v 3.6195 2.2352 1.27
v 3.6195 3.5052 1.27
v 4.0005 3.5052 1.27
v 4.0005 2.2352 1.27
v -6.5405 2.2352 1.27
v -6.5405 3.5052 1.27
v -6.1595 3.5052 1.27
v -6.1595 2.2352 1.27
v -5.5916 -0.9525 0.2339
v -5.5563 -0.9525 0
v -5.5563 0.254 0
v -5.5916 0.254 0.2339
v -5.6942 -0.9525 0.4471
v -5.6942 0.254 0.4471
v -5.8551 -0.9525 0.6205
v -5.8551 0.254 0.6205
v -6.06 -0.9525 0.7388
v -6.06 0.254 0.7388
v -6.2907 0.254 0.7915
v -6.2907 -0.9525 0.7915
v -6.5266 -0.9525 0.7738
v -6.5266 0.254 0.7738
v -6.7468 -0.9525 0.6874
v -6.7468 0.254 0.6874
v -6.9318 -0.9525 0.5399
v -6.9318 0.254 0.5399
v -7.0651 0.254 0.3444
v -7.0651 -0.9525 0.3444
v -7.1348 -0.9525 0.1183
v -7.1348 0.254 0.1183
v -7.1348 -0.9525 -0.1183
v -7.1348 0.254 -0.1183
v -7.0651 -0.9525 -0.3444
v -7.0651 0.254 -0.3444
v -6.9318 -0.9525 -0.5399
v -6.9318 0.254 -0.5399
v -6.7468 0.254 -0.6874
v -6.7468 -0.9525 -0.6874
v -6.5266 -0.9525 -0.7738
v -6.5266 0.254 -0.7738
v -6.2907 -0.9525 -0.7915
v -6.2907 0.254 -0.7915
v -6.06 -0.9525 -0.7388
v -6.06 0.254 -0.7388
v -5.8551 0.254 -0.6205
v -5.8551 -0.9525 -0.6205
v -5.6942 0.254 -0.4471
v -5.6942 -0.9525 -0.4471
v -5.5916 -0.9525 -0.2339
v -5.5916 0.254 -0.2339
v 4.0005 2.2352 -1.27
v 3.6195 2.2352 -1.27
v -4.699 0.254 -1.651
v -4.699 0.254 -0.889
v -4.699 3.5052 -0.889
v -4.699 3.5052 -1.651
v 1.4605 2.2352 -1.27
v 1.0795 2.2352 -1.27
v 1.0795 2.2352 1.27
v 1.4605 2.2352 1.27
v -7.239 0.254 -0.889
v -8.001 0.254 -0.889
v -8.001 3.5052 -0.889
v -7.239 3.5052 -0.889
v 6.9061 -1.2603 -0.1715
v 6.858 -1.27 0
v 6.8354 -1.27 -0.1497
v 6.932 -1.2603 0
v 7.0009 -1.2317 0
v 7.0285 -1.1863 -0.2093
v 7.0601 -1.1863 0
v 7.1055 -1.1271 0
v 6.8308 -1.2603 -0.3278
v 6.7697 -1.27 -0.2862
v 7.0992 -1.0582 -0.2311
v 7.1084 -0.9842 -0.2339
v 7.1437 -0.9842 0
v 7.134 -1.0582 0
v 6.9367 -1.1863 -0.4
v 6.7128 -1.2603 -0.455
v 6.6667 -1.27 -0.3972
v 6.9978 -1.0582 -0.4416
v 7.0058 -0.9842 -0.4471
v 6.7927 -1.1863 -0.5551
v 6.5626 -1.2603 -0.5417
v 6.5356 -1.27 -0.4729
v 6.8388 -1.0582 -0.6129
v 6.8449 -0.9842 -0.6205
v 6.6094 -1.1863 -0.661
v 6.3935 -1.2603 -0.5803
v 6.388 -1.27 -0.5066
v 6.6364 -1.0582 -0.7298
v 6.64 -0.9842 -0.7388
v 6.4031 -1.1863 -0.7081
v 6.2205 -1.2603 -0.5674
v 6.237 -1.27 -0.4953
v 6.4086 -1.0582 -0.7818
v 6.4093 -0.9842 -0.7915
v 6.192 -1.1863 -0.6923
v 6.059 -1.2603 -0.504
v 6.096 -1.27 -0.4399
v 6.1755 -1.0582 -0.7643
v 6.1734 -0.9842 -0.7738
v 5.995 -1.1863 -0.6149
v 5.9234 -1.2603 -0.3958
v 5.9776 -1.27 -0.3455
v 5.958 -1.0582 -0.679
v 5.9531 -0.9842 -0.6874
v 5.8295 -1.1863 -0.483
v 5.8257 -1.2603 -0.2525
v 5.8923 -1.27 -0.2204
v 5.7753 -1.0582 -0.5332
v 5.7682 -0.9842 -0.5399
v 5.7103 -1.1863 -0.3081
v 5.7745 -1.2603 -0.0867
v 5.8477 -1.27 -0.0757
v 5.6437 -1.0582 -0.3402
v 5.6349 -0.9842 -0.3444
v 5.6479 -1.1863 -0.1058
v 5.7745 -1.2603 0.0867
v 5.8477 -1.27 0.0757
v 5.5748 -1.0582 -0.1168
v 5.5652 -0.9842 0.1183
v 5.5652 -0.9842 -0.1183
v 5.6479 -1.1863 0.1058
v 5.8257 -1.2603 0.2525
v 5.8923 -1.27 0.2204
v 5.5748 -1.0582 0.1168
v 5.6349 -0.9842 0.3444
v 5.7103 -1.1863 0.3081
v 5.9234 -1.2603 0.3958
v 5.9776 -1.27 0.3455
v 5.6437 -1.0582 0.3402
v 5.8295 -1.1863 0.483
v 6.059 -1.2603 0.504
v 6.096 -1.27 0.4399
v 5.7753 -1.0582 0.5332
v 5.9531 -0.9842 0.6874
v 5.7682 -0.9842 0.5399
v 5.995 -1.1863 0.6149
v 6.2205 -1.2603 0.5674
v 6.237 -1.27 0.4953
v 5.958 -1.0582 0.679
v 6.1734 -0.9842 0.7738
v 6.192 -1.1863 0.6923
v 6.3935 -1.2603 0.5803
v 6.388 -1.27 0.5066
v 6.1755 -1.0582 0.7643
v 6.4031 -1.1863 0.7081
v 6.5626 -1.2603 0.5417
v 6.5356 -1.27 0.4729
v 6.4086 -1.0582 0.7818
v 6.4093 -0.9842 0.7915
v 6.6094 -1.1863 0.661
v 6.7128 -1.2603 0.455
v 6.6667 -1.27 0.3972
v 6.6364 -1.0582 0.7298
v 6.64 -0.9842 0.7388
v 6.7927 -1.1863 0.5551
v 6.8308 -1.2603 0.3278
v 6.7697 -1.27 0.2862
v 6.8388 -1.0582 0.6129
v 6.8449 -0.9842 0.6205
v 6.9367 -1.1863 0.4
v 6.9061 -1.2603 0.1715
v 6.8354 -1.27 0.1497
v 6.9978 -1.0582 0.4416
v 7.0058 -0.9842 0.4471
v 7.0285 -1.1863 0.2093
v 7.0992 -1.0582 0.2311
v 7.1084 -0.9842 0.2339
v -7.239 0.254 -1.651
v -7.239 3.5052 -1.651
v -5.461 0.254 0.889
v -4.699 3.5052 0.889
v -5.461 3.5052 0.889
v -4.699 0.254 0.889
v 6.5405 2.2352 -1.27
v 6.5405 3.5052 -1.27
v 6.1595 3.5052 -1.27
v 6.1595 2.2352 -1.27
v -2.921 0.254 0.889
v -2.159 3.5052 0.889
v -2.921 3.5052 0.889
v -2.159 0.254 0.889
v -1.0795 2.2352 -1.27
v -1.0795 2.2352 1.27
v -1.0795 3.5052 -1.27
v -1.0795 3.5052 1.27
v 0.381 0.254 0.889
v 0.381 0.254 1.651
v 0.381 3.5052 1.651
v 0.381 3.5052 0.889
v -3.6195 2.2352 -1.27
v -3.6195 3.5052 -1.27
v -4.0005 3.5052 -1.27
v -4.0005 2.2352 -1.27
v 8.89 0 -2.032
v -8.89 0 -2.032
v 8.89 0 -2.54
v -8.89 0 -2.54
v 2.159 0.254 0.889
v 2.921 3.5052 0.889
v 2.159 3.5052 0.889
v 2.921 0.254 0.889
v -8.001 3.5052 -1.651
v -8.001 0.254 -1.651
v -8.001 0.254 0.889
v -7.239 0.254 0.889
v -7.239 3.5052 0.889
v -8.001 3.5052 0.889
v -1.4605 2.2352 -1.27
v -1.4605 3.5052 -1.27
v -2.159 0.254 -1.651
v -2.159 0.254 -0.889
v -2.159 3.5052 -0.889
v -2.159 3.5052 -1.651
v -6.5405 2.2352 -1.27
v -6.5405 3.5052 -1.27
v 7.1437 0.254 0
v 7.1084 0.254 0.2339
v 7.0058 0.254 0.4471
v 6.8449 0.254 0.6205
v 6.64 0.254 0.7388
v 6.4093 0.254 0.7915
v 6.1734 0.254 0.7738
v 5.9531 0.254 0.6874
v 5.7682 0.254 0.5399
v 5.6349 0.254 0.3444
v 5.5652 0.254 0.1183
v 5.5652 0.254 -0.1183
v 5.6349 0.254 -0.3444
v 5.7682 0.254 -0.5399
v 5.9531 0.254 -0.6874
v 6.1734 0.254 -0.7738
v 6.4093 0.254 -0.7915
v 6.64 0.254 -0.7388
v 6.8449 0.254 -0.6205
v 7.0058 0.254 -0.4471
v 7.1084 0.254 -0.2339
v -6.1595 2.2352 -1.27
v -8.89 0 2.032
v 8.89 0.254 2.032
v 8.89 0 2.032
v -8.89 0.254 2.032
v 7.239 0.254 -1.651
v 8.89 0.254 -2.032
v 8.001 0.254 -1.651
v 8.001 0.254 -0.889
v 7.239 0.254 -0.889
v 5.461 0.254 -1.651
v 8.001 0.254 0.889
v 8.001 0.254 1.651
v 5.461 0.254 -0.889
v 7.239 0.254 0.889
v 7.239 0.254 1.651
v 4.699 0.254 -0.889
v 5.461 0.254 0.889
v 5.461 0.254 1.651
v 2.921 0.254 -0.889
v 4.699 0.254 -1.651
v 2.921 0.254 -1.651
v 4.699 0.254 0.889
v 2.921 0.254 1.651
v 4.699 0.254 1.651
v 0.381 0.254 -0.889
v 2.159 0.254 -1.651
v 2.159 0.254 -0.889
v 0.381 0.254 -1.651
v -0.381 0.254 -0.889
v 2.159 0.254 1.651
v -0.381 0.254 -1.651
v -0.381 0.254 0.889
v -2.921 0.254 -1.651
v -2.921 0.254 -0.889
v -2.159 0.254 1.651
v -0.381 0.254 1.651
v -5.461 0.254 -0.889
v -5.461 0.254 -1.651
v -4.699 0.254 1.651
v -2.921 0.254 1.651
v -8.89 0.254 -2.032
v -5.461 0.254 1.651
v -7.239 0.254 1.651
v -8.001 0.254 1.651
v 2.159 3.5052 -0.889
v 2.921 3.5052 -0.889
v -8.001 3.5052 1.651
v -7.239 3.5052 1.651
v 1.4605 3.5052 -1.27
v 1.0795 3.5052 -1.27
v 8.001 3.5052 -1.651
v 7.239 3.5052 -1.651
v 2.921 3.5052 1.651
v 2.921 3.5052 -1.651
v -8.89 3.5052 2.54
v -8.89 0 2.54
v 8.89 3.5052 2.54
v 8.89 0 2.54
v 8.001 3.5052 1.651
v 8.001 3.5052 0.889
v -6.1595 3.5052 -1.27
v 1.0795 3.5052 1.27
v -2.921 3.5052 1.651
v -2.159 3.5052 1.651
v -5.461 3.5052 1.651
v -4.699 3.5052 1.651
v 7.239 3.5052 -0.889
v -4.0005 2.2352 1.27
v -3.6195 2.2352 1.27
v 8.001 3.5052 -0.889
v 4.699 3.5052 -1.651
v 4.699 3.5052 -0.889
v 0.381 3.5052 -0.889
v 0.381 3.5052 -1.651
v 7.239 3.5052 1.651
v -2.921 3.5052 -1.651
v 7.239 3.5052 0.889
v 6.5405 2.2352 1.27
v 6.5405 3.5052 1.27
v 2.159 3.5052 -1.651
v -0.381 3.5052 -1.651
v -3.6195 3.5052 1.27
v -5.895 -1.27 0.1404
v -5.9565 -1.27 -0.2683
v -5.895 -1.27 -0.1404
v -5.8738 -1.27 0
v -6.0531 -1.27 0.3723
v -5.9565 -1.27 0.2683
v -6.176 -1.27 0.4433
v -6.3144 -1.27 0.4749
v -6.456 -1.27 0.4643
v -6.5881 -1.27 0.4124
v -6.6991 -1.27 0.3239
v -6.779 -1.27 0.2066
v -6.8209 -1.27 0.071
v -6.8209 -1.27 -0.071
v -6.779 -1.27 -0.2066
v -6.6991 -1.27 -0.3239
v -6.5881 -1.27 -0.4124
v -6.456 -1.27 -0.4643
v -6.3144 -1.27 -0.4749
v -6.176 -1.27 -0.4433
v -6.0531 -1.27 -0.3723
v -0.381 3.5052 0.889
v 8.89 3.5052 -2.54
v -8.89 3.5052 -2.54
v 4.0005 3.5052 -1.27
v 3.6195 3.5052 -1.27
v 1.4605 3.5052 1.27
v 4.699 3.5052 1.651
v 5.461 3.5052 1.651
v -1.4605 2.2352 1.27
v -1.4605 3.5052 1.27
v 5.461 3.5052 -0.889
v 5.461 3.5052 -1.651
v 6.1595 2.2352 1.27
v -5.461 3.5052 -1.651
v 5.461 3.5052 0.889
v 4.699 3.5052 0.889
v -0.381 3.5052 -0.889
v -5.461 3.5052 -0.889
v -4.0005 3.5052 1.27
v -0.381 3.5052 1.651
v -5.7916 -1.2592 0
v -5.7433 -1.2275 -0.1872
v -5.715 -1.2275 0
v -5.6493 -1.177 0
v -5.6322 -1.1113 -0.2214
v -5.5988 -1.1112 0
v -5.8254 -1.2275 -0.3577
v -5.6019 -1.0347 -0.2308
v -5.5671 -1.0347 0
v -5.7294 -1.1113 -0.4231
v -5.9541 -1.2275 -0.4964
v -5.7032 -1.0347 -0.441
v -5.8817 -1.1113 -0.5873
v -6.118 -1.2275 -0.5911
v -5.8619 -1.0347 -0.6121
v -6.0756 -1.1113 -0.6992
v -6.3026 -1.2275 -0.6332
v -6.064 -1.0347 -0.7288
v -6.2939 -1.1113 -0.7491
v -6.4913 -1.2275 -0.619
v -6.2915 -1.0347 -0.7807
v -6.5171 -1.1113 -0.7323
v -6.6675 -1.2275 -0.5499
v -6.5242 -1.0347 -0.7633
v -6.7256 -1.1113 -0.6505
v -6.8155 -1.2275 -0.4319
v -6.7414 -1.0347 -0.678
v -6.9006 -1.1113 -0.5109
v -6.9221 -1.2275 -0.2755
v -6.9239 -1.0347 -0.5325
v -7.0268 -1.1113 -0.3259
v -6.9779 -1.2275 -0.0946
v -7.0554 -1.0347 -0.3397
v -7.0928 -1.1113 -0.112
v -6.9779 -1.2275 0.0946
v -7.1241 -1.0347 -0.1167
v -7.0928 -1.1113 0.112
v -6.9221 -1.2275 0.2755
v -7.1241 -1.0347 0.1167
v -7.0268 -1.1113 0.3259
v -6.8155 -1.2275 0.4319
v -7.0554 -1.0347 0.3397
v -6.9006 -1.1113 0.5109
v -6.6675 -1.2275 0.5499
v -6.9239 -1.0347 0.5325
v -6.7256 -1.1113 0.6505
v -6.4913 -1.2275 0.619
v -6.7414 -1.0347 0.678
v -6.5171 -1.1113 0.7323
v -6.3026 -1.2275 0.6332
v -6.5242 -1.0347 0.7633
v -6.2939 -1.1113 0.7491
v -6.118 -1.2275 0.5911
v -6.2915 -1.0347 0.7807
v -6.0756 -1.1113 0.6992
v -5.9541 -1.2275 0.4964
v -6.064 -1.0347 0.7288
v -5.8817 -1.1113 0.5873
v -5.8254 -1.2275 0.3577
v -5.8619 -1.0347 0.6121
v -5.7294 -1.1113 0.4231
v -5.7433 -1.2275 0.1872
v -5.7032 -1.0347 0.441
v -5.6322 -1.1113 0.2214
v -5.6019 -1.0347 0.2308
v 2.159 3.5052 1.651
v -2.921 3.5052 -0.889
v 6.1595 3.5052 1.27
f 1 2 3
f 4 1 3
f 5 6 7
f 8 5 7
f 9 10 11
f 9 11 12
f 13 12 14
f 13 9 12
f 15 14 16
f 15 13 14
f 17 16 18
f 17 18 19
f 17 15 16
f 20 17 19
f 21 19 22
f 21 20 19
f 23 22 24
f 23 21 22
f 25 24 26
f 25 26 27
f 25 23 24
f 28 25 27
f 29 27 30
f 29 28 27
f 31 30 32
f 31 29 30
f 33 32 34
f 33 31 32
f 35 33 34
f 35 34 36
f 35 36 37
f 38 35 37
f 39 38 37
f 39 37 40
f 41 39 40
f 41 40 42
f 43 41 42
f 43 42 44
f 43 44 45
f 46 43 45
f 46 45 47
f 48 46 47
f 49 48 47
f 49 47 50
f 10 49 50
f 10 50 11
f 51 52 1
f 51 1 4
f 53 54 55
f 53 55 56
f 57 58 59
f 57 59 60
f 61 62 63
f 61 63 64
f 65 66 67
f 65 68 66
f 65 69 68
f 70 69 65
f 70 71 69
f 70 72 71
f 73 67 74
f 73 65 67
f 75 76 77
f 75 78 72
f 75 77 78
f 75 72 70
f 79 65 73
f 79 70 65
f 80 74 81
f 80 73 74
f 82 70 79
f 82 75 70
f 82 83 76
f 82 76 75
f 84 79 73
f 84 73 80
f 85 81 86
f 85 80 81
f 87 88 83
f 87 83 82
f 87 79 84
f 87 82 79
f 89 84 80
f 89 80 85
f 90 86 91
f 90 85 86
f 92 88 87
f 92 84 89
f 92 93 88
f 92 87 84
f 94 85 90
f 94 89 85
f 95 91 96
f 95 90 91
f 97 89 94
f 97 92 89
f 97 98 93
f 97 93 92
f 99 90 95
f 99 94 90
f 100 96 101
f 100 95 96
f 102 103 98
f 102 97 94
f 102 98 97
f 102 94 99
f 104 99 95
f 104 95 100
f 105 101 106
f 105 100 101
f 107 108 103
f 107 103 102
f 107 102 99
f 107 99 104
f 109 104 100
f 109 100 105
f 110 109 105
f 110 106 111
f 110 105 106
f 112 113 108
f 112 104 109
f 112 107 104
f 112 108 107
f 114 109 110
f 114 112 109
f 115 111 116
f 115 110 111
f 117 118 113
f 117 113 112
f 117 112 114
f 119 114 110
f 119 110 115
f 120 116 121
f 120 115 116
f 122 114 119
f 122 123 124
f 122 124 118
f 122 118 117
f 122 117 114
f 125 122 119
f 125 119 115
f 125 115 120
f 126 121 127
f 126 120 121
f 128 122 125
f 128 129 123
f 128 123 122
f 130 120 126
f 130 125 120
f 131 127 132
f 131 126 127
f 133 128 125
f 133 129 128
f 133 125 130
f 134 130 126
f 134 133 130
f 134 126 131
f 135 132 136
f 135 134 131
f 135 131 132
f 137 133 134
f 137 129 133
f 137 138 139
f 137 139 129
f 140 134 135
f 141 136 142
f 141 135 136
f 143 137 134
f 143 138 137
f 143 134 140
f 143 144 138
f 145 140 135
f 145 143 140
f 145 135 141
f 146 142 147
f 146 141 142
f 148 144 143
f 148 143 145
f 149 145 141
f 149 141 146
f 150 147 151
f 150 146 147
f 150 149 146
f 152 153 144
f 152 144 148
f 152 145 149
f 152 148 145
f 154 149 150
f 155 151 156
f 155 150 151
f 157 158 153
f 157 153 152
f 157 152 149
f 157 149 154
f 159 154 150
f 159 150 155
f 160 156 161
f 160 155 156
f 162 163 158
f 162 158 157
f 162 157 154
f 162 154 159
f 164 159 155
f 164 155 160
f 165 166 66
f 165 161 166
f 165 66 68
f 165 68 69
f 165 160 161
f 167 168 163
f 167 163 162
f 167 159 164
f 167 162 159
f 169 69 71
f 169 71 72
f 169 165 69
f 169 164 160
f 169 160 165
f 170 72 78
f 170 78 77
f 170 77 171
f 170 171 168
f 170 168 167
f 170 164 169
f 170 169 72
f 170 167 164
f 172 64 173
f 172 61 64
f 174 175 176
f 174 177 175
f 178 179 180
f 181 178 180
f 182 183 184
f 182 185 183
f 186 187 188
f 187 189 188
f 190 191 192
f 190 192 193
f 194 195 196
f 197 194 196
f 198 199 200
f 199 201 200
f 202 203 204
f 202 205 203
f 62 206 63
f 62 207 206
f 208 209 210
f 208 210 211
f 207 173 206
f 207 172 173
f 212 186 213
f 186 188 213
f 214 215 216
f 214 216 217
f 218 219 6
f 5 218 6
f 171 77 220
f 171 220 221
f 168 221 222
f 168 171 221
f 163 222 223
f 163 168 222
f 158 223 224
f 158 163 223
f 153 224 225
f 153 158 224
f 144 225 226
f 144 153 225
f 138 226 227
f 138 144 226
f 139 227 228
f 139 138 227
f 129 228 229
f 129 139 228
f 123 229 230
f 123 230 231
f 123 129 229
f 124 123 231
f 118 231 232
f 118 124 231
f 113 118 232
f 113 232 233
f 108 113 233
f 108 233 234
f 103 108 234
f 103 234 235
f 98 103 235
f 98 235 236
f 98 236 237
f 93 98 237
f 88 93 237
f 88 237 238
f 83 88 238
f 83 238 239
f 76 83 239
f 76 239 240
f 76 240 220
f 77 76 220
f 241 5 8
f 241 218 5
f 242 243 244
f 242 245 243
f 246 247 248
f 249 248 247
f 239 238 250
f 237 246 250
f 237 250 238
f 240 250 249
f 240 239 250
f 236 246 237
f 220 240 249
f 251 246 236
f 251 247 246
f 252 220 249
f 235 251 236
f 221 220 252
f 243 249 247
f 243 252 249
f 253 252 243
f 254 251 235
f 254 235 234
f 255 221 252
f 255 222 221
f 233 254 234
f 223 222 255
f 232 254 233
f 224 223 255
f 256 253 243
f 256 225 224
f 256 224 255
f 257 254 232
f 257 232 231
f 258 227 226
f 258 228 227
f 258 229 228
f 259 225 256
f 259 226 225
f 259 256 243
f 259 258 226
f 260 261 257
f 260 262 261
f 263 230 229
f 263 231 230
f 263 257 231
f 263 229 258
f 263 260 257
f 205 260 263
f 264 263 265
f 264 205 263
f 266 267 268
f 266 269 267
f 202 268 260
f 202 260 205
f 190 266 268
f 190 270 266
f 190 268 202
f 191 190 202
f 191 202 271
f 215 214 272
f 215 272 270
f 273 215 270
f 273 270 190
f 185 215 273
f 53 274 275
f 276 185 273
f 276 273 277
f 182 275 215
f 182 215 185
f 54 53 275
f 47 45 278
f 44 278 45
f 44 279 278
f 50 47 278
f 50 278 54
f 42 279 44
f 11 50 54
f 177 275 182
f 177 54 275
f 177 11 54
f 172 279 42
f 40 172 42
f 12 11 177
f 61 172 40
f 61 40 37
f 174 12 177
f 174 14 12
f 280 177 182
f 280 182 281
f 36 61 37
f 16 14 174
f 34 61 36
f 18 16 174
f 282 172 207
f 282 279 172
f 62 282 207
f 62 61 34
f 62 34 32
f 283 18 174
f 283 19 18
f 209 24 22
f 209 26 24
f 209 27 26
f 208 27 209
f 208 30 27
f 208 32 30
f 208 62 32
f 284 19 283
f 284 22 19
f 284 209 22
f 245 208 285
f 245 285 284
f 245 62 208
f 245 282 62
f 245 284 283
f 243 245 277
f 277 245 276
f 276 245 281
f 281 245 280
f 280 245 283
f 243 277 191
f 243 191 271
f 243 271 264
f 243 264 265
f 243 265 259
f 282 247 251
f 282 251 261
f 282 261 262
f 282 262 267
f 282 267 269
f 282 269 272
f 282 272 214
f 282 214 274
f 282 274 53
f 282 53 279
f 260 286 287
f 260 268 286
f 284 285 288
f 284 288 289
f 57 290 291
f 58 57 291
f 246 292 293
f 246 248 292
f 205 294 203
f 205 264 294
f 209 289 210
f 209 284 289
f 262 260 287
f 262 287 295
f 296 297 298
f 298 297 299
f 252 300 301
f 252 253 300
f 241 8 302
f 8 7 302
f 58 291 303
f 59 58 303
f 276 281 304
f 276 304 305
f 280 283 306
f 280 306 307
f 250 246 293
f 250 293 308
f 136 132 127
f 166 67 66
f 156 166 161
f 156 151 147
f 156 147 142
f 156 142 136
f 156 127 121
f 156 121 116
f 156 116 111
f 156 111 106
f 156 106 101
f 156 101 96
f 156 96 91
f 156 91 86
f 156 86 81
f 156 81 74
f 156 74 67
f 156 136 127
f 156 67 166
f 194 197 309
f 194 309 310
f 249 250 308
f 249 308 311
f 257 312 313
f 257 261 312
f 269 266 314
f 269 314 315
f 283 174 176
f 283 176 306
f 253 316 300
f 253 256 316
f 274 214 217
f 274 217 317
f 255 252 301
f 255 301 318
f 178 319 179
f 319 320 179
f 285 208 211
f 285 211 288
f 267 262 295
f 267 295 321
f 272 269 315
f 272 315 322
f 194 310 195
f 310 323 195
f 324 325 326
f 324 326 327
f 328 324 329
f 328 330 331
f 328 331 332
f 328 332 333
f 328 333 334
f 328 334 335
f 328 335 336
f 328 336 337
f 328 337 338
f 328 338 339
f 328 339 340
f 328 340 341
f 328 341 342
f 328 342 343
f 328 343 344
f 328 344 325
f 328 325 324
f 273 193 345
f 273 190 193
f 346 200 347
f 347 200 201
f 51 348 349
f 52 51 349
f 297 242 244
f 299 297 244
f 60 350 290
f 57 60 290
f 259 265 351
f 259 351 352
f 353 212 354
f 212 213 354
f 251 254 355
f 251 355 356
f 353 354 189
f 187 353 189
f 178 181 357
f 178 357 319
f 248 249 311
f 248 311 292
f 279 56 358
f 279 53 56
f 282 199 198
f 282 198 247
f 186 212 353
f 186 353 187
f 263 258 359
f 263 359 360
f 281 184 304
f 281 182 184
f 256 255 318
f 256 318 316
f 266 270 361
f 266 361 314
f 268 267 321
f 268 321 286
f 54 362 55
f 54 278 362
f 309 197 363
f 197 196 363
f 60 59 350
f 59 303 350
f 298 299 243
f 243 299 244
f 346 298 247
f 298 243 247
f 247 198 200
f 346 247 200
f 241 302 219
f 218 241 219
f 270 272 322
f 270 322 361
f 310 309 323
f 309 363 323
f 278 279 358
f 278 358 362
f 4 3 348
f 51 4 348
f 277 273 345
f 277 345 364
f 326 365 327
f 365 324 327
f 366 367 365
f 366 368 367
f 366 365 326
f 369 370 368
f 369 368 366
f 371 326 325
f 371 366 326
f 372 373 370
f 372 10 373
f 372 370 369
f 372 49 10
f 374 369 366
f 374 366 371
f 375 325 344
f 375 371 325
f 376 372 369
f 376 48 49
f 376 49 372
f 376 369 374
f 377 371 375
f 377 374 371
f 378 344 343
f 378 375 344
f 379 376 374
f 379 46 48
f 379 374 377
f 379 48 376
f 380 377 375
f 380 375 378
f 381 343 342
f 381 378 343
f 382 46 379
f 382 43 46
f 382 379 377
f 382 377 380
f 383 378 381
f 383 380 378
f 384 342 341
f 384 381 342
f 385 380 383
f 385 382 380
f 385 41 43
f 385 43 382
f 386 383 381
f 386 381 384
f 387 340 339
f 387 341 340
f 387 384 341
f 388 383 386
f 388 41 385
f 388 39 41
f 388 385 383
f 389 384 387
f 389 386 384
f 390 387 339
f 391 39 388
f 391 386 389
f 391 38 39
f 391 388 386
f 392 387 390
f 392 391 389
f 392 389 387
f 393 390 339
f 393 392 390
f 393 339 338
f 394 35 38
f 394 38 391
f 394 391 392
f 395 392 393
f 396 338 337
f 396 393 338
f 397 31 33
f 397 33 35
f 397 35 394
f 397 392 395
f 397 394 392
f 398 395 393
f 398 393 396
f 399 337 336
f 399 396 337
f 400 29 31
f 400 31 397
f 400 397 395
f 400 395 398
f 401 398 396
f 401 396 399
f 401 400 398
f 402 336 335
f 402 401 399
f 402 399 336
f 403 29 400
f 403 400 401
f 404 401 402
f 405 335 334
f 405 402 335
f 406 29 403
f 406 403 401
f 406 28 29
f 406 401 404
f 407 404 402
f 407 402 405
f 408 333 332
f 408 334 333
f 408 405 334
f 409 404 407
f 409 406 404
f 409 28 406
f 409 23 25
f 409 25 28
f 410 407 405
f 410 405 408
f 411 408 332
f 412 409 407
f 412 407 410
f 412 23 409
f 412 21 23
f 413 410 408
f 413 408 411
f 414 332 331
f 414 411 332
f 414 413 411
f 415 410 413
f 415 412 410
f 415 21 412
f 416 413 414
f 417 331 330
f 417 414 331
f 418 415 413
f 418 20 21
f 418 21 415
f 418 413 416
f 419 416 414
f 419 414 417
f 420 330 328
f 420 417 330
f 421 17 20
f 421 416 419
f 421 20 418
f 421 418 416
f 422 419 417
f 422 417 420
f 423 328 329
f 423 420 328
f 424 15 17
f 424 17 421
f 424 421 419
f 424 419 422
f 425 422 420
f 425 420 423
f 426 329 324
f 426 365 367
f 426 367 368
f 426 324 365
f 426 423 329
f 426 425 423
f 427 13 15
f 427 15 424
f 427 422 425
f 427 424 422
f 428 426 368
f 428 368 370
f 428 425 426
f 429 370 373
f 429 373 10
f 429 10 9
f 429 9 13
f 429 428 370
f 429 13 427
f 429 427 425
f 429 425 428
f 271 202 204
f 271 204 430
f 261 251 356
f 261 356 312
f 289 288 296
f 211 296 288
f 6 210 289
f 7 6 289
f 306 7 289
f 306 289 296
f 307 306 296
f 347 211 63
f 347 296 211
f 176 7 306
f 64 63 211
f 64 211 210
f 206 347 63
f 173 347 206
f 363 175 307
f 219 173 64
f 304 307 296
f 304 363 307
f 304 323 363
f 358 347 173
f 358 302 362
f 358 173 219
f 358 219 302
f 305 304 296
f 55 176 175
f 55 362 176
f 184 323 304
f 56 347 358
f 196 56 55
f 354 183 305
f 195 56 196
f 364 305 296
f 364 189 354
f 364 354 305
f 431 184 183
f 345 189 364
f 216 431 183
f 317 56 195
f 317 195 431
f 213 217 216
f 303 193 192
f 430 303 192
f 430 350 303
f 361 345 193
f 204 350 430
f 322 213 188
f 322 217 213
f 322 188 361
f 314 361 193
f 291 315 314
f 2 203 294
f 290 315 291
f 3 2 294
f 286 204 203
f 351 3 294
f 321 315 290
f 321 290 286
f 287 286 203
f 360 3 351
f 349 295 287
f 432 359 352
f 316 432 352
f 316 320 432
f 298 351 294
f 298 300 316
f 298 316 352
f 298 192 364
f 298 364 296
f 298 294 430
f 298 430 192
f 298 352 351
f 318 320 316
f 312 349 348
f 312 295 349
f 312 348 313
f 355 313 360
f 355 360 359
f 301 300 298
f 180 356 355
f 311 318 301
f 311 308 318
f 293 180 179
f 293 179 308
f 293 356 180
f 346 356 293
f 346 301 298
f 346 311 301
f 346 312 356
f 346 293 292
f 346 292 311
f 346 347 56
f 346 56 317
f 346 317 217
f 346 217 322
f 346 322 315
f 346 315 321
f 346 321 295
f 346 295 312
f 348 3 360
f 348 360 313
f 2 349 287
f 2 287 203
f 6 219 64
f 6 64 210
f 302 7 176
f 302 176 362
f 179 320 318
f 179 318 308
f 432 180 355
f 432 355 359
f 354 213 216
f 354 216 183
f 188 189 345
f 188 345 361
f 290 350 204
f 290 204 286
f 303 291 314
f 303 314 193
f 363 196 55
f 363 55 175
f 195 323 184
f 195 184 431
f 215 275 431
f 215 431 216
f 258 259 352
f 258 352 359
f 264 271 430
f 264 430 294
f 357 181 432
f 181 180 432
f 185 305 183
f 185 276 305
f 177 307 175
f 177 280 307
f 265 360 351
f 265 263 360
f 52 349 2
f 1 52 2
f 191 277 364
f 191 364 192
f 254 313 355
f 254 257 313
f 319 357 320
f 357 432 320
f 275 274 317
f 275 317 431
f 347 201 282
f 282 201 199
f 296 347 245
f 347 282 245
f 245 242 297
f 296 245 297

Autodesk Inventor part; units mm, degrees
sketch "Sketch_1" plane through (0, 0, 0) normal (0, 1, 0) x (1, 0, 0)
  line L0 (-8.89, 2.54) -> (-8.89, -2.54)
  line L1 (-8.89, -2.54) -> (8.89, -2.54)
  line L2 (8.89, -2.54) -> (8.89, 2.54)
  line L3 (8.89, 2.54) -> (-8.89, 2.54)
  line L4 (7.239, -0.889) -> (7.239, -1.651)
  line L5 (7.239, -1.651) -> (8.001, -1.651)
  line L6 (8.001, -1.651) -> (8.001, -0.889)
  line L7 (8.001, -0.889) -> (7.239, -0.889)
  line L8 (7.239, 1.651) -> (7.239, 0.889)
  line L9 (7.239, 0.889) -> (8.001, 0.889)
  line L10 (8.001, 0.889) -> (8.001, 1.651)
  line L11 (8.001, 1.651) -> (7.239, 1.651)
  line L12 (4.699, -0.889) -> (4.699, -1.651)
  line L13 (4.699, -1.651) -> (5.461, -1.651)
  line L14 (5.461, -1.651) -> (5.461, -0.889)
  line L15 (5.461, -0.889) -> (4.699, -0.889)
  line L16 (4.699, 1.651) -> (4.699, 0.889)
  line L17 (4.699, 0.889) -> (5.461, 0.889)
  line L18 (5.461, 0.889) -> (5.461, 1.651)
  line L19 (5.461, 1.651) -> (4.699, 1.651)
  line L20 (2.159, -0.889) -> (2.159, -1.651)
  line L21 (2.159, -1.651) -> (2.921, -1.651)
  line L22 (2.921, -1.651) -> (2.921, -0.889)
  line L23 (2.921, -0.889) -> (2.159, -0.889)
  line L24 (2.159, 1.651) -> (2.159, 0.889)
  line L25 (2.159, 0.889) -> (2.921, 0.889)
  line L26 (2.921, 0.889) -> (2.921, 1.651)
  line L27 (2.921, 1.651) -> (2.159, 1.651)
  line L28 (-0.381, -0.889) -> (-0.381, -1.651)
  line L29 (-0.381, -1.651) -> (0.381, -1.651)
  line L30 (0.381, -1.651) -> (0.381, -0.889)
  line L31 (0.381, -0.889) -> (-0.381, -0.889)
  line L32 (-0.381, 1.651) -> (-0.381, 0.889)
  line L33 (-0.381, 0.889) -> (0.381, 0.889)
  line L34 (0.381, 0.889) -> (0.381, 1.651)
  line L35 (0.381, 1.651) -> (-0.381, 1.651)
  line L36 (-2.921, -0.889) -> (-2.921, -1.651)
  line L37 (-2.921, -1.651) -> (-2.159, -1.651)
  line L38 (-2.159, -1.651) -> (-2.159, -0.889)
  line L39 (-2.159, -0.889) -> (-2.921, -0.889)
  line L40 (-2.921, 1.651) -> (-2.921, 0.889)
  line L41 (-2.921, 0.889) -> (-2.159, 0.889)
  line L42 (-2.159, 0.889) -> (-2.159, 1.651)
  line L43 (-2.159, 1.651) -> (-2.921, 1.651)
  line L44 (-5.461, -0.889) -> (-5.461, -1.651)
  line L45 (-5.461, -1.651) -> (-4.699, -1.651)
  line L46 (-4.699, -1.651) -> (-4.699, -0.889)
  line L47 (-4.699, -0.889) -> (-5.461, -0.889)
  line L48 (-5.461, 1.651) -> (-5.461, 0.889)
  line L49 (-5.461, 0.889) -> (-4.699, 0.889)
  line L50 (-4.699, 0.889) -> (-4.699, 1.651)
  line L51 (-4.699, 1.651) -> (-5.461, 1.651)
  line L52 (-8.001, -0.889) -> (-8.001, -1.651)
  line L53 (-8.001, -1.651) -> (-7.239, -1.651)
  line L54 (-7.239, -1.651) -> (-7.239, -0.889)
  line L55 (-7.239, -0.889) -> (-8.001, -0.889)
  line L56 (-8.001, 1.651) -> (-8.001, 0.889)
  line L57 (-8.001, 0.889) -> (-7.239, 0.889)
  line L58 (-7.239, 0.889) -> (-7.239, 1.651)
  line L59 (-7.239, 1.651) -> (-8.001, 1.651)
extrude "Extrusion1" add sketch "Sketch_1" along normal blind 3.5052
sketch "Sketch_4" plane through (0, 0, 0) normal (1, 0, 0) x (0, 1, 0)
  line L0 (0.254, 2.032) -> (0, 2.032)
  line L1 (0, 2.032) -> (0, -2.032)
  line L2 (0, -2.032) -> (0.254, -2.032)
  line L3 (0.254, -2.032) -> (0.254, 2.032)
extrude "Extrusion2" cut sketch "Sketch_4" along normal mid plane 17.78
sketch "Sketch_9" plane through (0, 0, 0) normal (0, 0, 1) x (1, 0, 0)
  line L0 (6.35, -1.27) -> (6.35, 0.635)
  line L1 (6.35, 0.635) -> (7.1437, 0.635)
  line L2 (7.1437, 0.635) -> (7.1437, -0.9842)
  arc A0 (6.858, -1.27) -> (7.1437, -0.9842) centre (6.858, -0.9843) ccw
  line L3 (6.858, -1.27) -> (6.35, -1.27)
  line L4 (6.35, -1.27) -> (6.35, 0.635)
revolve "Revolution1" add sketch "Sketch_9" angle 360 about axis through (6.35, -1.27, 0) along (0, -1, 0)
sketch "Sketch_10" plane through (0, 0, 0) normal (0, 0, 1) x (1, 0, 0)
  line L0 (-6.35, -1.27) -> (-6.35, 0.635)
  line L1 (-6.35, 0.635) -> (-5.5563, 0.635)
  line L2 (-5.5563, 0.635) -> (-5.5563, -0.9525)
  arc A0 (-5.8738, -1.27) -> (-5.5563, -0.9525) centre (-5.8738, -0.9525) ccw
  line L3 (-5.8738, -1.27) -> (-6.35, -1.27)
  line L4 (-6.35, -1.27) -> (-6.35, 0.635)
revolve "Revolution2" add sketch "Sketch_10" angle 360 about axis through (-6.35, -1.27, 0) along (0, -1, 0)
sketch "Sketch_11" plane through (0, 3.5052, 0) normal (0, 1, 0) x (1, 0, 0)
  line L0 (-6.5405, 1.27) -> (-6.5405, -1.27)
  line L1 (-6.5405, -1.27) -> (-6.1595, -1.27)
  line L2 (-6.1595, -1.27) -> (-6.1595, 1.27)
  line L3 (-6.1595, 1.27) -> (-6.5405, 1.27)
extrude "Extrusion3" cut sketch "Sketch_11" against normal blind 1.27
pattern_linear "Rectangular Pattern1" count 6 spacing 2.54 along (1, 0, 0) of "Extrusion3"
ref_plane "socket_to_dummy_XY" through (0, 0, 0) normal (0, -1, 0) x (1, 0, 0)
ref_plane "socket_to_dummy_YZ" through (0, 0, 0) normal (1, 0, 0) x (0, 0, 1)
ref_plane "socket_to_dummy_ZX" through (0, 0, 0) normal (0, 0, 1) x (0, -1, 0)
ref_plane "socket_to_pad_XY" through (0, 3.5052, 0) normal (0, 1, 0) x (1, 0, 0)
ref_plane "socket_to_pad_YZ" through (0, 3.5052, 0) normal (1, 0, 0) x (0, 0, -1)
ref_plane "socket_to_pad_ZX" through (0, 3.5052, 0) normal (0, 0, -1) x (0, 1, 0)
properties part number "HLE-107-02-DV-A_socket"
